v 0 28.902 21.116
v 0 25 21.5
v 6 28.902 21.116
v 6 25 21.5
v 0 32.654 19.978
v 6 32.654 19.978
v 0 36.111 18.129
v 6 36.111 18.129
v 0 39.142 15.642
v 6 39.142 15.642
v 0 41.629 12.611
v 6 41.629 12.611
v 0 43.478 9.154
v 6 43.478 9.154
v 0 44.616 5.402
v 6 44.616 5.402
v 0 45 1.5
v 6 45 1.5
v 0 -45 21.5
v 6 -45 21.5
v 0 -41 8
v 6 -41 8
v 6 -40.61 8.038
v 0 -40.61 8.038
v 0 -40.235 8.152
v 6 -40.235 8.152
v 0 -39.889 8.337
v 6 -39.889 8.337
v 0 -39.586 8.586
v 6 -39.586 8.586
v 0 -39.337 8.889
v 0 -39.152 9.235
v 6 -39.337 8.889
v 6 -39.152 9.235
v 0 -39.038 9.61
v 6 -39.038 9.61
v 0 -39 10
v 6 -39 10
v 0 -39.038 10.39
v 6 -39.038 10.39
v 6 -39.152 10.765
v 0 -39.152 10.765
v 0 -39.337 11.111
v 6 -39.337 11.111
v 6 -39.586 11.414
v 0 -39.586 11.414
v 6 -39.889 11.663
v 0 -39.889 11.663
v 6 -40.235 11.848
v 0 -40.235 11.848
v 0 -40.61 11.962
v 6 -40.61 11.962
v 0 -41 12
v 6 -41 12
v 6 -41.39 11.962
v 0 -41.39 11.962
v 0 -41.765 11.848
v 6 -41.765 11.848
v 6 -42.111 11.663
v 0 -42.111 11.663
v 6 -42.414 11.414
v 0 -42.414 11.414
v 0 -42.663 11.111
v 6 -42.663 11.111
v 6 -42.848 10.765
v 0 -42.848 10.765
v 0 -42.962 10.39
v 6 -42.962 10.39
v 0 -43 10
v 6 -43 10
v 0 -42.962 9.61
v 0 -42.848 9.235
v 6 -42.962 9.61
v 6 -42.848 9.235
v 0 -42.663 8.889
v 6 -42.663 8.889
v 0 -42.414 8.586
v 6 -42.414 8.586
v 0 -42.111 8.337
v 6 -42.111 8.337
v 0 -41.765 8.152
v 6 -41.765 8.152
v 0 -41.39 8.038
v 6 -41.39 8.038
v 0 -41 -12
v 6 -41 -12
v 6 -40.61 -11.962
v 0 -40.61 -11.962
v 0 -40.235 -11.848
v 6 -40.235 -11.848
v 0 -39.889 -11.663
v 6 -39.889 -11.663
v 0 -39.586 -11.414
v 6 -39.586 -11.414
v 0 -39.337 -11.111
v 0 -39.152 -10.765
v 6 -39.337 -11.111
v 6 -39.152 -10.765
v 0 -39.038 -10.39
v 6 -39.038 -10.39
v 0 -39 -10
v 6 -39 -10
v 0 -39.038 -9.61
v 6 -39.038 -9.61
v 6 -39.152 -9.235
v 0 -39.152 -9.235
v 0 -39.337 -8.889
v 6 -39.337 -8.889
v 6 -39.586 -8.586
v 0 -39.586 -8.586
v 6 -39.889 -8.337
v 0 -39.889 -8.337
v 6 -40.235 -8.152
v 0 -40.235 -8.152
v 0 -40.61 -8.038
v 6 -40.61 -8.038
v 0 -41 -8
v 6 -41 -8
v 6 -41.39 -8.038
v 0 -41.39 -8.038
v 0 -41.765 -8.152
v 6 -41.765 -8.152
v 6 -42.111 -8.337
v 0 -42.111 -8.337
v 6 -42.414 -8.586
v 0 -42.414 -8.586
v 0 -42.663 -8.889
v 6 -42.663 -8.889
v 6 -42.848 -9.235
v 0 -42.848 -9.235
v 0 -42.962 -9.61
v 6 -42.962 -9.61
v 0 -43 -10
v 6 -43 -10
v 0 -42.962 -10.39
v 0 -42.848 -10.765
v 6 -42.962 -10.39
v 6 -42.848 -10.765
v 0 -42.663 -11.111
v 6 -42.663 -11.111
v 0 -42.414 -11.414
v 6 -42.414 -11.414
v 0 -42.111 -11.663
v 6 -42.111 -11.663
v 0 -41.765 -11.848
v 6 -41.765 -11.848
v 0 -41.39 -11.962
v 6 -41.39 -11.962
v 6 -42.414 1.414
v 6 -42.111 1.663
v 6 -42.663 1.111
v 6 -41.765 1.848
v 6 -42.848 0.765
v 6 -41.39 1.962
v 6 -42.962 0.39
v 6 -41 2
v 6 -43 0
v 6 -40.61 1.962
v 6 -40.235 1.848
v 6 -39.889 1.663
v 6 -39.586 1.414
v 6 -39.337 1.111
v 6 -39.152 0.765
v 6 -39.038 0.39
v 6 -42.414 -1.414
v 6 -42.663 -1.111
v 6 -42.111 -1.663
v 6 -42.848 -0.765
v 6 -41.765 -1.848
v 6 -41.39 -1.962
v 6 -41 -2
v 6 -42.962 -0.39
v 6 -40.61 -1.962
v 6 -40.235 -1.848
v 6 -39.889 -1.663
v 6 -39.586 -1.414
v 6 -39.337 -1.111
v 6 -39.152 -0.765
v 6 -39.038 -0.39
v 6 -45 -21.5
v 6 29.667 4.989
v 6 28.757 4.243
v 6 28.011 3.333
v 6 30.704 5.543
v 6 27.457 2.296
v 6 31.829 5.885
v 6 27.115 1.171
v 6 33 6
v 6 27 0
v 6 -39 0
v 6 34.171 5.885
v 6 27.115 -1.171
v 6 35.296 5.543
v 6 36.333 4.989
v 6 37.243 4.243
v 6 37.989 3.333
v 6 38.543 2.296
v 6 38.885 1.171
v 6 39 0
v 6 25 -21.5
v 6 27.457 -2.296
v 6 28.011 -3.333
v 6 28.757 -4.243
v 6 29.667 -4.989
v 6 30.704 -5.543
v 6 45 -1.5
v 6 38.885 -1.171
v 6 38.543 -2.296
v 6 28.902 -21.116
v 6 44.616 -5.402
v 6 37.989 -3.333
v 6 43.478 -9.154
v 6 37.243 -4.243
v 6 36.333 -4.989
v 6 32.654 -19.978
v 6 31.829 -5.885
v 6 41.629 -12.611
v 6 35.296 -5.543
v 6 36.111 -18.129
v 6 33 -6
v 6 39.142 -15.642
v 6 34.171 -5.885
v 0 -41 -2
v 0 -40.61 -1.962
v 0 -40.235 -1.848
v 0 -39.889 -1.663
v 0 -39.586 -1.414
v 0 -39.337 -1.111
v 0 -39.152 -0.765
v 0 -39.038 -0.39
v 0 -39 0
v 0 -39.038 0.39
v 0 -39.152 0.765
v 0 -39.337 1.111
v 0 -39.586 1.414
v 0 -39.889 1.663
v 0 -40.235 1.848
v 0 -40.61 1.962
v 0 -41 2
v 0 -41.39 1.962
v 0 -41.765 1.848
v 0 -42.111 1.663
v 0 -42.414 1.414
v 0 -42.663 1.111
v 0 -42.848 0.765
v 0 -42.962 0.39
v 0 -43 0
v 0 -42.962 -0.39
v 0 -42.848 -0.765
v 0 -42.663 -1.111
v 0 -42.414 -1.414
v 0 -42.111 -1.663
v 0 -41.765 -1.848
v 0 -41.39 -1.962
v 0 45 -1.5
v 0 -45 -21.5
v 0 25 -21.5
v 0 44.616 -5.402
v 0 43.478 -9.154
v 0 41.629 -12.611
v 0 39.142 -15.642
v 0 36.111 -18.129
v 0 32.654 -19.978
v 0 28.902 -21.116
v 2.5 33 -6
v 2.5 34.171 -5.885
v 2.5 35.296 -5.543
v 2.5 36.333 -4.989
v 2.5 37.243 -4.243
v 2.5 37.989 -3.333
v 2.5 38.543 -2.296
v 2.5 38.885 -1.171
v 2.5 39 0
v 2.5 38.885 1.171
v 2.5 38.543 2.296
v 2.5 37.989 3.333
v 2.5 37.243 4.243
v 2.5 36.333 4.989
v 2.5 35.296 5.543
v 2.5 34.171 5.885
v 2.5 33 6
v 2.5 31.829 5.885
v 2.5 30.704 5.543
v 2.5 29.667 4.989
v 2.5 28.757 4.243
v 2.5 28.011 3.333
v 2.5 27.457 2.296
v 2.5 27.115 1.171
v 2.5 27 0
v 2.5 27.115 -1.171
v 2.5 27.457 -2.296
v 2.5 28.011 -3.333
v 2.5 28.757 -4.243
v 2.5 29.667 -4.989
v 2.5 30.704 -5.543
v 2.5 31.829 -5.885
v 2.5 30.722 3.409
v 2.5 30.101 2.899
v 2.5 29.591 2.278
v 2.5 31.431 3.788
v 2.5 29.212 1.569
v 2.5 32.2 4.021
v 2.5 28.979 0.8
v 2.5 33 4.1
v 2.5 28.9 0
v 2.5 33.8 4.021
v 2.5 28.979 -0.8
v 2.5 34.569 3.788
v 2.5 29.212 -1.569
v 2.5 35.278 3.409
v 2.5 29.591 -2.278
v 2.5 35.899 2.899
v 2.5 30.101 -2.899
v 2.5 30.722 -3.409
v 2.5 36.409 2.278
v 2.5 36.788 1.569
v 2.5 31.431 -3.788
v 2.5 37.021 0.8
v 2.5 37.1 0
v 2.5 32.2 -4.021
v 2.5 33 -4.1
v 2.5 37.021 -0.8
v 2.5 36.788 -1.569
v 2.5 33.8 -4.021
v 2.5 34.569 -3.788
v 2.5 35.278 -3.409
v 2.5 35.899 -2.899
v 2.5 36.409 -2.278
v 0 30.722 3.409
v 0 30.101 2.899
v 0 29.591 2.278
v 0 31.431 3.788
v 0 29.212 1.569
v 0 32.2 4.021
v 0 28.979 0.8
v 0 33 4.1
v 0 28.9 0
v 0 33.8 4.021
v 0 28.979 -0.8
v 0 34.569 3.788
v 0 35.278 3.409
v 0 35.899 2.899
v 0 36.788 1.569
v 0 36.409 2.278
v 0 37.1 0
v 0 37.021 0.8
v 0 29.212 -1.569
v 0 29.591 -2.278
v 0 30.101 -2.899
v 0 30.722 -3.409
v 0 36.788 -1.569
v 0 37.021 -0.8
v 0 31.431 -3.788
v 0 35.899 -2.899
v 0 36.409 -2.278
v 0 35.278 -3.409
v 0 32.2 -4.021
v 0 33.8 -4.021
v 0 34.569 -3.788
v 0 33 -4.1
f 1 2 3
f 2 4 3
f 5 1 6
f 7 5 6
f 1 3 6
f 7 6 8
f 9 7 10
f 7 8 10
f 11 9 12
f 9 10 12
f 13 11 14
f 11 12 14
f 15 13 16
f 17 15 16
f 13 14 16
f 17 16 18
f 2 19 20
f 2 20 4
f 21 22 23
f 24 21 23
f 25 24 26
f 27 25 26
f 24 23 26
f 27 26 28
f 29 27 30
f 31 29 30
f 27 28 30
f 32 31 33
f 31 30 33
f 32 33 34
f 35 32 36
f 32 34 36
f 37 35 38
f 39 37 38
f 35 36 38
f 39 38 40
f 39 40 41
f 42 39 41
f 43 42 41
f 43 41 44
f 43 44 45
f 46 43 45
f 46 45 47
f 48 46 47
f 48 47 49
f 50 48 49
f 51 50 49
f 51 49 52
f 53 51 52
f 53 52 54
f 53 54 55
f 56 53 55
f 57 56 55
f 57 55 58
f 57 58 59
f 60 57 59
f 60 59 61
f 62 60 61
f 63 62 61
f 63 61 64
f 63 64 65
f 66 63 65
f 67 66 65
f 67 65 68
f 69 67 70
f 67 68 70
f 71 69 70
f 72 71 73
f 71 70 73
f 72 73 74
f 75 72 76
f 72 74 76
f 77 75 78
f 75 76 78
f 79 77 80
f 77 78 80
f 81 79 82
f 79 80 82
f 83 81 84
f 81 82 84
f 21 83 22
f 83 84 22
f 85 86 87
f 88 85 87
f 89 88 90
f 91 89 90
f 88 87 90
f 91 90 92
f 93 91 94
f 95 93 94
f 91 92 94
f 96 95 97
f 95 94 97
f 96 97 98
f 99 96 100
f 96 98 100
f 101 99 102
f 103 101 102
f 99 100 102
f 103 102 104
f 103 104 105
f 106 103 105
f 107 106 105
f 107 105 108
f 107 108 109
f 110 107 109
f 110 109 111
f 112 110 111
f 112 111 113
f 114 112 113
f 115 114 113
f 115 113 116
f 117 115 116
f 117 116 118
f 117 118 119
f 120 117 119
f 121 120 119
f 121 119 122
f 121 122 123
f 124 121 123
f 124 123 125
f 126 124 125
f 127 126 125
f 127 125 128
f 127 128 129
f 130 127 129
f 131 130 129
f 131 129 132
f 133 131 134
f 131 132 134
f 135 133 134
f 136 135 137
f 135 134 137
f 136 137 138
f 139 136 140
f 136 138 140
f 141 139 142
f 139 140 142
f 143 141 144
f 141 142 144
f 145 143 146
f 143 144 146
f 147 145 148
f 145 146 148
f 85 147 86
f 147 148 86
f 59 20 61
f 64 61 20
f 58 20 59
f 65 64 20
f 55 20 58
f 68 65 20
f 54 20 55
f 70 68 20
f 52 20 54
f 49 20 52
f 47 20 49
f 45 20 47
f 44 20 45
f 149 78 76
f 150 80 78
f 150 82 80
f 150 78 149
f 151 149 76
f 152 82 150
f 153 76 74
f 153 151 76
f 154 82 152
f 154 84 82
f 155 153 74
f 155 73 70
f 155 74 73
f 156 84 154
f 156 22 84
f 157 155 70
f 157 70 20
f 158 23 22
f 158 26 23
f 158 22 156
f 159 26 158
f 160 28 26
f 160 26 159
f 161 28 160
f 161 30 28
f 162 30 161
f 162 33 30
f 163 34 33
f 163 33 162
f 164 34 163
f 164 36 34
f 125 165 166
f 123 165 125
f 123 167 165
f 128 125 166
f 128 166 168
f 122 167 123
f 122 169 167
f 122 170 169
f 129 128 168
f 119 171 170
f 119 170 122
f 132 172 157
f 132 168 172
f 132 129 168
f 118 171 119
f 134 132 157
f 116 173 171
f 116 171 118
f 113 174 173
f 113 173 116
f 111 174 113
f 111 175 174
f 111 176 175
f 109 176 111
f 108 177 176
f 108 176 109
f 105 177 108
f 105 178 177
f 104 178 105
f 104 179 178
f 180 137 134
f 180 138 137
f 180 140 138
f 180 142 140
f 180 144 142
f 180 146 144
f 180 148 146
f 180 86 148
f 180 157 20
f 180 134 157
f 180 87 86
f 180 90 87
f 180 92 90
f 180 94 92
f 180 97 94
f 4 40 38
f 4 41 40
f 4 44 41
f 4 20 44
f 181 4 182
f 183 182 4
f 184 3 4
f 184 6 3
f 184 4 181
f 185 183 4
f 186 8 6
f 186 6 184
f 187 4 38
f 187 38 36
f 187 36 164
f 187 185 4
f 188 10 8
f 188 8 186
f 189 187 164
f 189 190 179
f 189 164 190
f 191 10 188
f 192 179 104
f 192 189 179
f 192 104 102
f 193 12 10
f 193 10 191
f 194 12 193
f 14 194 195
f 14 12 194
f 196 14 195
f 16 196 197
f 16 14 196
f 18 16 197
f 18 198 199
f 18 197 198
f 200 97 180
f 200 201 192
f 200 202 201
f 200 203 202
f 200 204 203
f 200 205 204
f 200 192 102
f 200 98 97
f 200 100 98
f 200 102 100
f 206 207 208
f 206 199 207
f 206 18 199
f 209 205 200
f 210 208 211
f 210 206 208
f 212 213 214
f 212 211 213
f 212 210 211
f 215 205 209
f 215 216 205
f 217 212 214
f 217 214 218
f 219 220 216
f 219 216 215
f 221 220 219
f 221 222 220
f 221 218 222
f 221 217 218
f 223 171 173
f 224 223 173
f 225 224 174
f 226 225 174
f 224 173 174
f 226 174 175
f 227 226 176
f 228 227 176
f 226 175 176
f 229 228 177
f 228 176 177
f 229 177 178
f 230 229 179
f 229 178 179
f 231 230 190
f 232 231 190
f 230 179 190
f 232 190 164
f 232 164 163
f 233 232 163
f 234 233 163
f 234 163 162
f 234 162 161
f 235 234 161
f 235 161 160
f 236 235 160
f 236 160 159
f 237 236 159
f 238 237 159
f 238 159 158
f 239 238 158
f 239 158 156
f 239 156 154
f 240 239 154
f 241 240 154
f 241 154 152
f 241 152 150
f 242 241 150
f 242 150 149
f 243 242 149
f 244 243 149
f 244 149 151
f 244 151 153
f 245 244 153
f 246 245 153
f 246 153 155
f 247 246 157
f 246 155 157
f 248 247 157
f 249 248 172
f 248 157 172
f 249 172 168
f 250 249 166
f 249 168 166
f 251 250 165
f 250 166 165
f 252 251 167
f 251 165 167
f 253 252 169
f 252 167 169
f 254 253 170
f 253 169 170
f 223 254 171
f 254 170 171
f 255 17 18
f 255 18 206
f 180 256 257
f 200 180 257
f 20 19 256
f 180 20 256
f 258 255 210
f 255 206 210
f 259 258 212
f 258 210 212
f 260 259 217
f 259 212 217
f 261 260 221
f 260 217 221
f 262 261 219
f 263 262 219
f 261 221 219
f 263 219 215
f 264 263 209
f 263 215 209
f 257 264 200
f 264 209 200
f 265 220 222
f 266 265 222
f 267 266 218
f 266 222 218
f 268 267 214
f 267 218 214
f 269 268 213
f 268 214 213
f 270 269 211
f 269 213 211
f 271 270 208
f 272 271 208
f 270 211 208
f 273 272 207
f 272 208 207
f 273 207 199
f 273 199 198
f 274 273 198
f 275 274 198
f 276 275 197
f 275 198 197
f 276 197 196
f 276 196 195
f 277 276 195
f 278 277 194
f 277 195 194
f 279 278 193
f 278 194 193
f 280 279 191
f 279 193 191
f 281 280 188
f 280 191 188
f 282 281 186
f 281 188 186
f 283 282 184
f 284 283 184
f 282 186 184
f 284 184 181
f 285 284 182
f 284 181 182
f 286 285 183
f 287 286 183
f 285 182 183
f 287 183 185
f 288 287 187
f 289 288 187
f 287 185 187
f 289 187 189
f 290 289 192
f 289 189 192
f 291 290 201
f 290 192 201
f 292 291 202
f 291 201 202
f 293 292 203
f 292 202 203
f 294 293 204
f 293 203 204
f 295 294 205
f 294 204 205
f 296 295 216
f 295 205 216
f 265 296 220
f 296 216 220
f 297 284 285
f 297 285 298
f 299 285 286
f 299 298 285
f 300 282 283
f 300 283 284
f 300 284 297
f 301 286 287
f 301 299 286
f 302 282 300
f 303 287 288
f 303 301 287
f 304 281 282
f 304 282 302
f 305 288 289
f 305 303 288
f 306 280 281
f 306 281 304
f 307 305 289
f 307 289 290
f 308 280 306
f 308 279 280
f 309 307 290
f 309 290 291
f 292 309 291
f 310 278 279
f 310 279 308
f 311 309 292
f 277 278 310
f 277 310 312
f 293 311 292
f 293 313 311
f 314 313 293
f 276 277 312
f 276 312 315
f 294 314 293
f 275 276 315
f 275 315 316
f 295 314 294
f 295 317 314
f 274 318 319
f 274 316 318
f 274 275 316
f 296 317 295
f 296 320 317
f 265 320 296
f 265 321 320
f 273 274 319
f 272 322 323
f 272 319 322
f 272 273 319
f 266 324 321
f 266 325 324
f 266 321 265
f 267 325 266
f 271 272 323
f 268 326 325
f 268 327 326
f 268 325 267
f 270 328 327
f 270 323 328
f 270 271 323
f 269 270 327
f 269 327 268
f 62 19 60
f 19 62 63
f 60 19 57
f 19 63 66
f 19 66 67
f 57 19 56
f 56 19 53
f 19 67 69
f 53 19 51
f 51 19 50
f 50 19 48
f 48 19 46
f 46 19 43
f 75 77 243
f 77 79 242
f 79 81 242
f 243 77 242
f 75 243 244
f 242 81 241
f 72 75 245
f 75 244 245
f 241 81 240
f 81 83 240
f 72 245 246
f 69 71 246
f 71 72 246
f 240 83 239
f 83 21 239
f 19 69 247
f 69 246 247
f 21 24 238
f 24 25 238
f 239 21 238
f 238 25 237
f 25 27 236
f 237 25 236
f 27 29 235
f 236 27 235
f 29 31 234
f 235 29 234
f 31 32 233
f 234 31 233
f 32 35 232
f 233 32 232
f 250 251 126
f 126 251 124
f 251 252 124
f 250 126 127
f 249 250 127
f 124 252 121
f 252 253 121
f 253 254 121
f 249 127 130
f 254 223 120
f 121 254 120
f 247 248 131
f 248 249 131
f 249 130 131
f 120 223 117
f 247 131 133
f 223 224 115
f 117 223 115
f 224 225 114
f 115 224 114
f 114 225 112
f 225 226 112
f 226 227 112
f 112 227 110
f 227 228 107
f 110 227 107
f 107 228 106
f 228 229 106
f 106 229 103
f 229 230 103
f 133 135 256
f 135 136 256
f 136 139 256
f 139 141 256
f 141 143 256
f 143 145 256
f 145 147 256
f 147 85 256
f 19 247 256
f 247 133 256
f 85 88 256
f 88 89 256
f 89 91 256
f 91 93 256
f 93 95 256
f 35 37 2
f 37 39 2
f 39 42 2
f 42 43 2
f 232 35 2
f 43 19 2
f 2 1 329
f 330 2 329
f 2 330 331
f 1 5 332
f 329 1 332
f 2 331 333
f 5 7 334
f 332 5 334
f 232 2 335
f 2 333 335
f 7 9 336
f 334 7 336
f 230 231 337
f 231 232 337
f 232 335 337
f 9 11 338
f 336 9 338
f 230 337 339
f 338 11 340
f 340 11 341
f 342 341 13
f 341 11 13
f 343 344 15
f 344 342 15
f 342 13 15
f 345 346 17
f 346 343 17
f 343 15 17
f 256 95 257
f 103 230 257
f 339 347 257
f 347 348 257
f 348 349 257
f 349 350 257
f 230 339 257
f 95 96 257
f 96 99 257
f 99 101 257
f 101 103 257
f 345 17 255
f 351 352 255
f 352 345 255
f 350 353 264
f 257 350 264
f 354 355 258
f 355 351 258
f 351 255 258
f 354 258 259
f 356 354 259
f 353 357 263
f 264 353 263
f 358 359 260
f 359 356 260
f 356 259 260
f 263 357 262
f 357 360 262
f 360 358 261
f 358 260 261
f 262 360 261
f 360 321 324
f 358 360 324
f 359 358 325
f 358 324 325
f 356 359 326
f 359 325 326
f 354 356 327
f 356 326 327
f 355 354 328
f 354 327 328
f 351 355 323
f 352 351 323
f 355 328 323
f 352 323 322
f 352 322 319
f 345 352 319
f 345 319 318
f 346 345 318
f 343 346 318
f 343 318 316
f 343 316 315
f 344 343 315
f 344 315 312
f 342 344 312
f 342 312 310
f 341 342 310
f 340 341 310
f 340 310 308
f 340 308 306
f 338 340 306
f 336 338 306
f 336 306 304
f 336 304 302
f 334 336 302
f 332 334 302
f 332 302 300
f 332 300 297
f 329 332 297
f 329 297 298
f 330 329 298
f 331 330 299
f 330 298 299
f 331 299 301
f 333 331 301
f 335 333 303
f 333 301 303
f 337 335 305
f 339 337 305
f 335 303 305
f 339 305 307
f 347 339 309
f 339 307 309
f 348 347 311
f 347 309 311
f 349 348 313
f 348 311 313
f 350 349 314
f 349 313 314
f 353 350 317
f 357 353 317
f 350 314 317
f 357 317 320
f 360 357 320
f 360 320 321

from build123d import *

# Parameters (mm, degrees)
SKETCH1_W           = 43
SKETCH1_H           = 90
BOSS_EXTRUDE1_DEPTH = 6
CUT_EXTRUDE1_REACH  = 52.232
SKETCH2_R           = 2
CUT_EXTRUDE2_REACH  = 52.232
SKETCH3_R           = 4.1
FILLET1_R           = 20
SKETCH4_R           = 6
CUT_EXTRUDE3_DEPTH  = 3.5


with BuildPart() as part:
    # Sketch1 → Boss-Extrude1 (new body)
    with BuildSketch(Plane(origin=(0, 0, 0), x_dir=(0, 0, -1), z_dir=(1, 0, 0))):
        Rectangle(SKETCH1_W, SKETCH1_H)
    extrude(amount=BOSS_EXTRUDE1_DEPTH)

    # Sketch2 → Cut-Extrude1 (cut, up to next)
    with BuildSketch(Plane(origin=(6, 0, 0), x_dir=(0, 0, -1), z_dir=(1, 0, 0)), mode=Mode.PRIVATE) as cut_extrude1_sk1:
        with Locations((0, -41)):
            Circle(SKETCH2_R)
    cut_extrude1_tool1 = extrude(cut_extrude1_sk1.sketch, amount=-CUT_EXTRUDE1_REACH, mode=Mode.PRIVATE) & part.part
    # Sketch2 → Cut-Extrude1 (cut, up to next)
    with BuildSketch(Plane(origin=(6, 0, 0), x_dir=(0, 0, -1), z_dir=(1, 0, 0)), mode=Mode.PRIVATE) as cut_extrude1_sk2:
        with Locations((10, -41)):
            Circle(SKETCH2_R)
    cut_extrude1_tool2 = extrude(cut_extrude1_sk2.sketch, amount=-CUT_EXTRUDE1_REACH, mode=Mode.PRIVATE) & part.part
    # Sketch2 → Cut-Extrude1 (cut, up to next)
    with BuildSketch(Plane(origin=(6, 0, 0), x_dir=(0, 0, -1), z_dir=(1, 0, 0)), mode=Mode.PRIVATE) as cut_extrude1_sk3:
        with Locations((-10, -41)):
            Circle(SKETCH2_R)
    cut_extrude1_tool3 = extrude(cut_extrude1_sk3.sketch, amount=-CUT_EXTRUDE1_REACH, mode=Mode.PRIVATE) & part.part
    add(cut_extrude1_tool1.solids().sort_by_distance((6, -41, 0))[0], mode=Mode.SUBTRACT)
    add(cut_extrude1_tool2.solids().sort_by_distance((6, -41, -10))[0], mode=Mode.SUBTRACT)
    add(cut_extrude1_tool3.solids().sort_by_distance((6, -41, 10))[0], mode=Mode.SUBTRACT)

    # Sketch3 → Cut-Extrude2 (cut, up to next)
    with BuildSketch(Plane(origin=(6, 0, 0), x_dir=(0, 0, -1), z_dir=(1, 0, 0)), mode=Mode.PRIVATE) as cut_extrude2_sk1:
        with Locations((0, 33)):
            Circle(SKETCH3_R)
    cut_extrude2_tool1 = extrude(cut_extrude2_sk1.sketch, amount=-CUT_EXTRUDE2_REACH, mode=Mode.PRIVATE) & part.part
    add(cut_extrude2_tool1.solids().sort_by_distance((6, 33, 0))[0], mode=Mode.SUBTRACT)

    # Fillet1
    fillet1_edges = [part.edges().sort_by_distance(p)[0] for p in [
        (3, 45, 21.5),
        (3, 45, -21.5),
    ]]
    fillet(fillet1_edges, radius=FILLET1_R)

    # Sketch4 → Cut-Extrude3 (cut)
    with BuildSketch(Plane(origin=(6, 0, 0), x_dir=(0, 0, -1), z_dir=(1, 0, 0))):
        with Locations((0, 33)):
            Circle(SKETCH4_R)
    extrude(amount=-CUT_EXTRUDE3_DEPTH, mode=Mode.SUBTRACT)


solid = part.part
